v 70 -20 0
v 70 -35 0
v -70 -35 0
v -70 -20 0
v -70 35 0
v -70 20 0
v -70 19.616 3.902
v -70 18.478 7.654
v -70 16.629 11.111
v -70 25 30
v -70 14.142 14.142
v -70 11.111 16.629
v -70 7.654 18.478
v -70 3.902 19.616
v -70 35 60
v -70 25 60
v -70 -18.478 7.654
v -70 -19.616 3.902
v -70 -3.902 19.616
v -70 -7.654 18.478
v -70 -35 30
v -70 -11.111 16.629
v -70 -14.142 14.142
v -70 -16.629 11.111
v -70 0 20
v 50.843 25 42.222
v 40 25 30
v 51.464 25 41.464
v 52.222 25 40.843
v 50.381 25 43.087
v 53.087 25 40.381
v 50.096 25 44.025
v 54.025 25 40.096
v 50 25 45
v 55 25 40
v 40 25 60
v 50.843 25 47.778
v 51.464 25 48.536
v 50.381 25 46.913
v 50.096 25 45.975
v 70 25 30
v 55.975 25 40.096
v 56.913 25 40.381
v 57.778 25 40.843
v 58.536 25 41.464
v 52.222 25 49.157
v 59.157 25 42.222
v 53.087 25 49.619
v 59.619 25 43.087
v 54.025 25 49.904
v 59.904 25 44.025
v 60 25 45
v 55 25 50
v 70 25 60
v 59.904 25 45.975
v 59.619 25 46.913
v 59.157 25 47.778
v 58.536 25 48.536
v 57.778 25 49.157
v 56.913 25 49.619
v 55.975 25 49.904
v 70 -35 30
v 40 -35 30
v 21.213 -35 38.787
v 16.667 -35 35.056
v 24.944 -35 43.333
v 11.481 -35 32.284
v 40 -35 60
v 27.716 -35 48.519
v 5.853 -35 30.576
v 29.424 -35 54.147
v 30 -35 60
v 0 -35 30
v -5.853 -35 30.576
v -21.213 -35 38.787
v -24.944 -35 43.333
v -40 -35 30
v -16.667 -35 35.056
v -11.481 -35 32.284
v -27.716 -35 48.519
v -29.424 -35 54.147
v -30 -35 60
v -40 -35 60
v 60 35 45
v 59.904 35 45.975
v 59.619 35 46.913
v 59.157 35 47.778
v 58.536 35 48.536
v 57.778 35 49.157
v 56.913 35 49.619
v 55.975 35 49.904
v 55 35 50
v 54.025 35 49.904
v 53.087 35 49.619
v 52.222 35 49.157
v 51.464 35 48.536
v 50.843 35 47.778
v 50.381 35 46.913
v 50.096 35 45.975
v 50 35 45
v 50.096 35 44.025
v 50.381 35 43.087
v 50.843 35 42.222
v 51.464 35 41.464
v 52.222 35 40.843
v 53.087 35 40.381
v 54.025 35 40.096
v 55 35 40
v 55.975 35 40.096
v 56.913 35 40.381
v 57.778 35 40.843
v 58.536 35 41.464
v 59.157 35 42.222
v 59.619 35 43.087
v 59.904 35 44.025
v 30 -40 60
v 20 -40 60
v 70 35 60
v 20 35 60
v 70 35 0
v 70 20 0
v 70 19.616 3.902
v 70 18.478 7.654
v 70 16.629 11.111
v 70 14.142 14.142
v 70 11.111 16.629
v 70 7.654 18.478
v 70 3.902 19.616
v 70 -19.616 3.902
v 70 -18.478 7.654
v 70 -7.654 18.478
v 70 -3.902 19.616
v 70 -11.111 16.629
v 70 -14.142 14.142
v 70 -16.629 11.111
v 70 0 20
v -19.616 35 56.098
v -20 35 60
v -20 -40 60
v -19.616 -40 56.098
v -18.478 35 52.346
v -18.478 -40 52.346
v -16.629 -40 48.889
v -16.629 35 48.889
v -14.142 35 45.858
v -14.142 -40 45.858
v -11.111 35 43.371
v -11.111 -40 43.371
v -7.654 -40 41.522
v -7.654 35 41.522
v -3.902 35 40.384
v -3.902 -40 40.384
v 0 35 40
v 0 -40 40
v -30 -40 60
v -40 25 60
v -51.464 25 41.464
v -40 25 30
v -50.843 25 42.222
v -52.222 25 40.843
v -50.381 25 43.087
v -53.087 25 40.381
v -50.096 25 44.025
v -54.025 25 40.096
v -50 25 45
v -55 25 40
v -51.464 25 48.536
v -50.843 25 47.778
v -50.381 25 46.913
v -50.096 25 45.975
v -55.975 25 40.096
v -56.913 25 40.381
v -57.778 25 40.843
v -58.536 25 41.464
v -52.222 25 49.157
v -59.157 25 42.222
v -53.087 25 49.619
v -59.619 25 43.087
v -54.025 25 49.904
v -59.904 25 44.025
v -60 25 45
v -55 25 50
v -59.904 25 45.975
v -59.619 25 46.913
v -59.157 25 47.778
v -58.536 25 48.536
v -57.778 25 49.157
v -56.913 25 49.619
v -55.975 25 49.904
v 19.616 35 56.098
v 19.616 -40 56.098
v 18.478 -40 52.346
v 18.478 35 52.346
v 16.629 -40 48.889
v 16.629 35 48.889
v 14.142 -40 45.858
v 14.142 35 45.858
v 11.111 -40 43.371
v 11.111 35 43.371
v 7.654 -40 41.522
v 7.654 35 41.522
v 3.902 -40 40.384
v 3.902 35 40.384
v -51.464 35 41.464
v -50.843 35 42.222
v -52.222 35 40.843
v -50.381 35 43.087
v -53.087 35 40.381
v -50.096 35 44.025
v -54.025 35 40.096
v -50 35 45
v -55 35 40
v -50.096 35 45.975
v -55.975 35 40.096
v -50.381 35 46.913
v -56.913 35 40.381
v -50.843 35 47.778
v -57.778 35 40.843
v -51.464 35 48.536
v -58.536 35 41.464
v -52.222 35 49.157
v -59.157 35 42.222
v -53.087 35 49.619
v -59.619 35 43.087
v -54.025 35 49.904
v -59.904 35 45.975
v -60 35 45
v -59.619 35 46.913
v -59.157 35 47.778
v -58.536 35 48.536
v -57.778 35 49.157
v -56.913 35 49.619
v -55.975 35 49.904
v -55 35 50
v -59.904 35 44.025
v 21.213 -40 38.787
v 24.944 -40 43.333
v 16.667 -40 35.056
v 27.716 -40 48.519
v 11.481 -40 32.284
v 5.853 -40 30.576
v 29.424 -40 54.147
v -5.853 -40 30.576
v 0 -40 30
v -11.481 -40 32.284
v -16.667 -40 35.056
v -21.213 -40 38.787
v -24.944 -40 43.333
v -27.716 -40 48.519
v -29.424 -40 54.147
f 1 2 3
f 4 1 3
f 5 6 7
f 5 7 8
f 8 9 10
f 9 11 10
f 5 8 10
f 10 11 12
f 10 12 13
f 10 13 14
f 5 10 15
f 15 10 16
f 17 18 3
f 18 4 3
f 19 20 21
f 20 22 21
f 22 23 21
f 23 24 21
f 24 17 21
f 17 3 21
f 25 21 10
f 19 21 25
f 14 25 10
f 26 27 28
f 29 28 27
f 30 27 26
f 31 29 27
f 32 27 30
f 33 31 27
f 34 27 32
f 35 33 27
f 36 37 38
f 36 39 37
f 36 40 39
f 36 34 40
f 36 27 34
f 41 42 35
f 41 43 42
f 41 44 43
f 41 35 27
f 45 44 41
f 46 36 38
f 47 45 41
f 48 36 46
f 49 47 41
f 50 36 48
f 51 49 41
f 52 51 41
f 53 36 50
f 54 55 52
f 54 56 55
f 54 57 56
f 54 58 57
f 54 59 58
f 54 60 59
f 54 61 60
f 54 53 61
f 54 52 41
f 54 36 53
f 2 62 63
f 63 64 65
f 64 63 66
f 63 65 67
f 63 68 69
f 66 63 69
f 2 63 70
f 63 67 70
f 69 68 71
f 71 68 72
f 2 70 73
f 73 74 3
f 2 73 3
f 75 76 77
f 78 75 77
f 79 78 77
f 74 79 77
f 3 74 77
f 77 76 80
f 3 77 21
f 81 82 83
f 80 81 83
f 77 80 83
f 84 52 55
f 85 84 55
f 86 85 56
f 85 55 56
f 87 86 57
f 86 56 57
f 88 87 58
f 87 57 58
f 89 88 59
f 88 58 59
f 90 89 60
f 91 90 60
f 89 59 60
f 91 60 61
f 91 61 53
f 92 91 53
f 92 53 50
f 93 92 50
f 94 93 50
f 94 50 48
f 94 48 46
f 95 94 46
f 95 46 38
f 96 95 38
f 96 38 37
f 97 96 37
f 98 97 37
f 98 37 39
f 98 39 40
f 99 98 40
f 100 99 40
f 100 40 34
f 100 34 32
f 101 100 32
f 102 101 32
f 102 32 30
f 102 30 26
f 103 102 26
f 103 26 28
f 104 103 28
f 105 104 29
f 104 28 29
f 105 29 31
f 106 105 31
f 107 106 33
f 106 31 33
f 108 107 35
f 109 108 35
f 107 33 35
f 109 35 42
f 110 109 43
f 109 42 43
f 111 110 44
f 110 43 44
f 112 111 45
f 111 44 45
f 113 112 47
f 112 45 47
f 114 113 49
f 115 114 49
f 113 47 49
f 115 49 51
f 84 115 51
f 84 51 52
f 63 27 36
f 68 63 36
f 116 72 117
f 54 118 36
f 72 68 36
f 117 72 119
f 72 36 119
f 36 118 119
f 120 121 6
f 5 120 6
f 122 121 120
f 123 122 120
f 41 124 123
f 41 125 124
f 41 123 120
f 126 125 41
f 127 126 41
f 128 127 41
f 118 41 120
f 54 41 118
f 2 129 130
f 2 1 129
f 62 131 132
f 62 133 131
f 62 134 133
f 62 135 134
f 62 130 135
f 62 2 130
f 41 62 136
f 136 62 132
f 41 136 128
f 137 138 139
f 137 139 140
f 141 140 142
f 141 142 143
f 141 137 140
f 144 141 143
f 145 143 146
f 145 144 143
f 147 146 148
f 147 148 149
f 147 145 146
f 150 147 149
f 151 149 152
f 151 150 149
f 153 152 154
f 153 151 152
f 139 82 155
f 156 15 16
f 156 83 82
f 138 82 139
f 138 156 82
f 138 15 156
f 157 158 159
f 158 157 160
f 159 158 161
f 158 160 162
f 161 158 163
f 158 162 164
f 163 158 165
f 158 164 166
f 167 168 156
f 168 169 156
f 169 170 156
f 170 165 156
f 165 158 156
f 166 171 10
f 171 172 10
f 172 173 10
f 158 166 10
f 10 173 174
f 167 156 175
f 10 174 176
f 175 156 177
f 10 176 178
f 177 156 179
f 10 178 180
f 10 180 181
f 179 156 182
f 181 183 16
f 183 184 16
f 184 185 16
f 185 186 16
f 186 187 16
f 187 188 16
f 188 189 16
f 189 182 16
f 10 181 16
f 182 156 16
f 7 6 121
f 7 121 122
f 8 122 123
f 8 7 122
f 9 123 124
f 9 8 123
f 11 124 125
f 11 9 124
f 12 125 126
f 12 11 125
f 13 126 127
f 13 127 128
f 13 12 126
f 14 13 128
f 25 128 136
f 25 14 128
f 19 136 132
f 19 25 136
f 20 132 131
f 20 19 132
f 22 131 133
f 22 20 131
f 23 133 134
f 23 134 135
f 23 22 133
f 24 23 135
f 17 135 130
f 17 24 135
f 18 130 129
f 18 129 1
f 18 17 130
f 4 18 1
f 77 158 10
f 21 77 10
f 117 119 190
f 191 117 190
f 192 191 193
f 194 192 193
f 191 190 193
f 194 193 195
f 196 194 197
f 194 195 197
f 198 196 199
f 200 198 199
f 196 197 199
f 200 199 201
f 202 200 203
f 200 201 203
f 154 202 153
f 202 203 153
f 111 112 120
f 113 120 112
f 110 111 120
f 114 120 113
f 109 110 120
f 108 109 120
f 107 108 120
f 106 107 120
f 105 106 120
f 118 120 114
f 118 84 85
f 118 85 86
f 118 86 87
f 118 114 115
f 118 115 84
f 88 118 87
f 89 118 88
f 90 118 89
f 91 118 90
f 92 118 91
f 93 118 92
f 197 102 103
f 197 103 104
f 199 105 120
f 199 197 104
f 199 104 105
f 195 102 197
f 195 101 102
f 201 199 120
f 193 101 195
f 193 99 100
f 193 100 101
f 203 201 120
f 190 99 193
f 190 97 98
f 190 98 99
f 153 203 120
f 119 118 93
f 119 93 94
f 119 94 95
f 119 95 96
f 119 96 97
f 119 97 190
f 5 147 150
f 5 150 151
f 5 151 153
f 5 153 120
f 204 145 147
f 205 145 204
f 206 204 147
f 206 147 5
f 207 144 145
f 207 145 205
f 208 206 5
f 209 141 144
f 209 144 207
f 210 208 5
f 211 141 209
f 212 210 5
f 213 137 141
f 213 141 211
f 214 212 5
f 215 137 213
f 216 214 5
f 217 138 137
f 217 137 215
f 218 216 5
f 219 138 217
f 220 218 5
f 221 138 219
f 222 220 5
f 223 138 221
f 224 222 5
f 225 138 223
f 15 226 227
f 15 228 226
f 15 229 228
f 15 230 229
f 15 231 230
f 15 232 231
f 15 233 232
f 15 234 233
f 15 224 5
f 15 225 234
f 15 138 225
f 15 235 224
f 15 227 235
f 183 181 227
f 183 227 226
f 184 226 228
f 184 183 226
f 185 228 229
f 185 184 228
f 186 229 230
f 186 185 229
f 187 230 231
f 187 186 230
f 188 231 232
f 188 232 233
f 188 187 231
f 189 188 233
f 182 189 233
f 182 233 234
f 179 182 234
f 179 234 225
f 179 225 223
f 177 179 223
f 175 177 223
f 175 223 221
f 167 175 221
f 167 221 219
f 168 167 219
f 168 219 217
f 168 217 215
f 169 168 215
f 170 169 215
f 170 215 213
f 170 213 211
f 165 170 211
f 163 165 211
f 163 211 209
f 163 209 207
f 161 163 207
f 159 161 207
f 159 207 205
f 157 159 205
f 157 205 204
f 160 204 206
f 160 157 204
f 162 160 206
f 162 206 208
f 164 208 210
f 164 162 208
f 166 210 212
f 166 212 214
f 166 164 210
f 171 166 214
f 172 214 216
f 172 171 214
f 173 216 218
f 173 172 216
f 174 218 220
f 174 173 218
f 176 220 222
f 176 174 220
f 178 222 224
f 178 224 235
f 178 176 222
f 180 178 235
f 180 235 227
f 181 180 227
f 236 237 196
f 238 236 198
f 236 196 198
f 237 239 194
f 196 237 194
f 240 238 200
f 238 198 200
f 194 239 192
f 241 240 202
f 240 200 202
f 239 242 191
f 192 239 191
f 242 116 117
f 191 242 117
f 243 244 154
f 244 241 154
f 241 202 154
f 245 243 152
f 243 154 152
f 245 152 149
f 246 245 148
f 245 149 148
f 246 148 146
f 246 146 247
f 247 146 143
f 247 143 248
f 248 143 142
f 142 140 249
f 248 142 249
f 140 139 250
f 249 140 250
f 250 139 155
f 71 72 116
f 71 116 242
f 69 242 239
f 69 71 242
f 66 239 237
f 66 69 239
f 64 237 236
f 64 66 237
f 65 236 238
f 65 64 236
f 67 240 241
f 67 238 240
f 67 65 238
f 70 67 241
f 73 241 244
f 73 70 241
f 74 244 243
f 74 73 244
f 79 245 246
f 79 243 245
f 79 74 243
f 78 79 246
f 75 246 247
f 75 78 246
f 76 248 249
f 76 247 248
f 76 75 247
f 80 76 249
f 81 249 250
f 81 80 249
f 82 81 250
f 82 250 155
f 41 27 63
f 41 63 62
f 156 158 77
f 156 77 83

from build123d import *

# Parameters (mm, degrees)
F1_DEPTH = 35
F2_W     = 30
F2_H     = 30
F3_DEPTH = 60
F4_R     = 5
F5_DEPTH = 10.001
F7_DEPTH = 70.001
F8_DEPTH = 40


with BuildPart() as f1:
    # F0 (on Front) → F1 (new body, symmetric)
    with BuildSketch(Plane.XZ):
        with BuildLine():
            Line((0, 30), (0, 0))
            Line((0, 0), (70, 0))
            Line((70, 0), (70, 60))
            Line((70, 60), (30, 60))
            ThreePointArc((30, 60), (21.2132034356, 38.7867965644), (0, 30))
        make_face()
        with BuildLine():
            Line((0, 40), (0, 30))
            ThreePointArc((0, 30), (21.2132034356, 38.7867965644), (30, 60))
            Line((30, 60), (20, 60))
            ThreePointArc((20, 60), (14.1421356237, 45.8578643763), (0, 40))
        make_face()
    extrude(amount=F1_DEPTH, both=True)

    # F2 (on face) → F3 (cut)
    with BuildSketch(Plane.XZ.offset(35)):
        with Locations((55, 45)):
            Rectangle(F2_W, F2_H)
    extrude(amount=-F3_DEPTH, mode=Mode.SUBTRACT)

    # F4 (on face) → F5 (cut, through all)
    with BuildSketch(Plane.XZ.offset(-25)):
        with Locations((55, 45)):
            Circle(F4_R)
    extrude(amount=-F5_DEPTH, mode=Mode.SUBTRACT)

    # F6 (on face) → F7 (cut, through all)
    with BuildSketch(Plane.YZ.offset(70)):
        with BuildLine():
            Line((-20, 0), (20, 0))
            ThreePointArc((20, 0), (0, 20), (-20, 0))
        make_face()
    extrude(amount=-F7_DEPTH, mode=Mode.SUBTRACT)

    # F0 (on Front) → F8 (join)
    with BuildSketch(Plane.XZ):
        with BuildLine():
            Line((0, 40), (0, 30))
            ThreePointArc((0, 30), (21.2132034356, 38.7867965644), (30, 60))
            Line((30, 60), (20, 60))
            ThreePointArc((20, 60), (14.1421356237, 45.8578643763), (0, 40))
        make_face()
    extrude(amount=F8_DEPTH)

    # F9: F1 across plane


with BuildPart() as f1_1:
    add(f1.part)
    add(f1.part.mirror(Plane.YZ))


solid = f1_1.part
